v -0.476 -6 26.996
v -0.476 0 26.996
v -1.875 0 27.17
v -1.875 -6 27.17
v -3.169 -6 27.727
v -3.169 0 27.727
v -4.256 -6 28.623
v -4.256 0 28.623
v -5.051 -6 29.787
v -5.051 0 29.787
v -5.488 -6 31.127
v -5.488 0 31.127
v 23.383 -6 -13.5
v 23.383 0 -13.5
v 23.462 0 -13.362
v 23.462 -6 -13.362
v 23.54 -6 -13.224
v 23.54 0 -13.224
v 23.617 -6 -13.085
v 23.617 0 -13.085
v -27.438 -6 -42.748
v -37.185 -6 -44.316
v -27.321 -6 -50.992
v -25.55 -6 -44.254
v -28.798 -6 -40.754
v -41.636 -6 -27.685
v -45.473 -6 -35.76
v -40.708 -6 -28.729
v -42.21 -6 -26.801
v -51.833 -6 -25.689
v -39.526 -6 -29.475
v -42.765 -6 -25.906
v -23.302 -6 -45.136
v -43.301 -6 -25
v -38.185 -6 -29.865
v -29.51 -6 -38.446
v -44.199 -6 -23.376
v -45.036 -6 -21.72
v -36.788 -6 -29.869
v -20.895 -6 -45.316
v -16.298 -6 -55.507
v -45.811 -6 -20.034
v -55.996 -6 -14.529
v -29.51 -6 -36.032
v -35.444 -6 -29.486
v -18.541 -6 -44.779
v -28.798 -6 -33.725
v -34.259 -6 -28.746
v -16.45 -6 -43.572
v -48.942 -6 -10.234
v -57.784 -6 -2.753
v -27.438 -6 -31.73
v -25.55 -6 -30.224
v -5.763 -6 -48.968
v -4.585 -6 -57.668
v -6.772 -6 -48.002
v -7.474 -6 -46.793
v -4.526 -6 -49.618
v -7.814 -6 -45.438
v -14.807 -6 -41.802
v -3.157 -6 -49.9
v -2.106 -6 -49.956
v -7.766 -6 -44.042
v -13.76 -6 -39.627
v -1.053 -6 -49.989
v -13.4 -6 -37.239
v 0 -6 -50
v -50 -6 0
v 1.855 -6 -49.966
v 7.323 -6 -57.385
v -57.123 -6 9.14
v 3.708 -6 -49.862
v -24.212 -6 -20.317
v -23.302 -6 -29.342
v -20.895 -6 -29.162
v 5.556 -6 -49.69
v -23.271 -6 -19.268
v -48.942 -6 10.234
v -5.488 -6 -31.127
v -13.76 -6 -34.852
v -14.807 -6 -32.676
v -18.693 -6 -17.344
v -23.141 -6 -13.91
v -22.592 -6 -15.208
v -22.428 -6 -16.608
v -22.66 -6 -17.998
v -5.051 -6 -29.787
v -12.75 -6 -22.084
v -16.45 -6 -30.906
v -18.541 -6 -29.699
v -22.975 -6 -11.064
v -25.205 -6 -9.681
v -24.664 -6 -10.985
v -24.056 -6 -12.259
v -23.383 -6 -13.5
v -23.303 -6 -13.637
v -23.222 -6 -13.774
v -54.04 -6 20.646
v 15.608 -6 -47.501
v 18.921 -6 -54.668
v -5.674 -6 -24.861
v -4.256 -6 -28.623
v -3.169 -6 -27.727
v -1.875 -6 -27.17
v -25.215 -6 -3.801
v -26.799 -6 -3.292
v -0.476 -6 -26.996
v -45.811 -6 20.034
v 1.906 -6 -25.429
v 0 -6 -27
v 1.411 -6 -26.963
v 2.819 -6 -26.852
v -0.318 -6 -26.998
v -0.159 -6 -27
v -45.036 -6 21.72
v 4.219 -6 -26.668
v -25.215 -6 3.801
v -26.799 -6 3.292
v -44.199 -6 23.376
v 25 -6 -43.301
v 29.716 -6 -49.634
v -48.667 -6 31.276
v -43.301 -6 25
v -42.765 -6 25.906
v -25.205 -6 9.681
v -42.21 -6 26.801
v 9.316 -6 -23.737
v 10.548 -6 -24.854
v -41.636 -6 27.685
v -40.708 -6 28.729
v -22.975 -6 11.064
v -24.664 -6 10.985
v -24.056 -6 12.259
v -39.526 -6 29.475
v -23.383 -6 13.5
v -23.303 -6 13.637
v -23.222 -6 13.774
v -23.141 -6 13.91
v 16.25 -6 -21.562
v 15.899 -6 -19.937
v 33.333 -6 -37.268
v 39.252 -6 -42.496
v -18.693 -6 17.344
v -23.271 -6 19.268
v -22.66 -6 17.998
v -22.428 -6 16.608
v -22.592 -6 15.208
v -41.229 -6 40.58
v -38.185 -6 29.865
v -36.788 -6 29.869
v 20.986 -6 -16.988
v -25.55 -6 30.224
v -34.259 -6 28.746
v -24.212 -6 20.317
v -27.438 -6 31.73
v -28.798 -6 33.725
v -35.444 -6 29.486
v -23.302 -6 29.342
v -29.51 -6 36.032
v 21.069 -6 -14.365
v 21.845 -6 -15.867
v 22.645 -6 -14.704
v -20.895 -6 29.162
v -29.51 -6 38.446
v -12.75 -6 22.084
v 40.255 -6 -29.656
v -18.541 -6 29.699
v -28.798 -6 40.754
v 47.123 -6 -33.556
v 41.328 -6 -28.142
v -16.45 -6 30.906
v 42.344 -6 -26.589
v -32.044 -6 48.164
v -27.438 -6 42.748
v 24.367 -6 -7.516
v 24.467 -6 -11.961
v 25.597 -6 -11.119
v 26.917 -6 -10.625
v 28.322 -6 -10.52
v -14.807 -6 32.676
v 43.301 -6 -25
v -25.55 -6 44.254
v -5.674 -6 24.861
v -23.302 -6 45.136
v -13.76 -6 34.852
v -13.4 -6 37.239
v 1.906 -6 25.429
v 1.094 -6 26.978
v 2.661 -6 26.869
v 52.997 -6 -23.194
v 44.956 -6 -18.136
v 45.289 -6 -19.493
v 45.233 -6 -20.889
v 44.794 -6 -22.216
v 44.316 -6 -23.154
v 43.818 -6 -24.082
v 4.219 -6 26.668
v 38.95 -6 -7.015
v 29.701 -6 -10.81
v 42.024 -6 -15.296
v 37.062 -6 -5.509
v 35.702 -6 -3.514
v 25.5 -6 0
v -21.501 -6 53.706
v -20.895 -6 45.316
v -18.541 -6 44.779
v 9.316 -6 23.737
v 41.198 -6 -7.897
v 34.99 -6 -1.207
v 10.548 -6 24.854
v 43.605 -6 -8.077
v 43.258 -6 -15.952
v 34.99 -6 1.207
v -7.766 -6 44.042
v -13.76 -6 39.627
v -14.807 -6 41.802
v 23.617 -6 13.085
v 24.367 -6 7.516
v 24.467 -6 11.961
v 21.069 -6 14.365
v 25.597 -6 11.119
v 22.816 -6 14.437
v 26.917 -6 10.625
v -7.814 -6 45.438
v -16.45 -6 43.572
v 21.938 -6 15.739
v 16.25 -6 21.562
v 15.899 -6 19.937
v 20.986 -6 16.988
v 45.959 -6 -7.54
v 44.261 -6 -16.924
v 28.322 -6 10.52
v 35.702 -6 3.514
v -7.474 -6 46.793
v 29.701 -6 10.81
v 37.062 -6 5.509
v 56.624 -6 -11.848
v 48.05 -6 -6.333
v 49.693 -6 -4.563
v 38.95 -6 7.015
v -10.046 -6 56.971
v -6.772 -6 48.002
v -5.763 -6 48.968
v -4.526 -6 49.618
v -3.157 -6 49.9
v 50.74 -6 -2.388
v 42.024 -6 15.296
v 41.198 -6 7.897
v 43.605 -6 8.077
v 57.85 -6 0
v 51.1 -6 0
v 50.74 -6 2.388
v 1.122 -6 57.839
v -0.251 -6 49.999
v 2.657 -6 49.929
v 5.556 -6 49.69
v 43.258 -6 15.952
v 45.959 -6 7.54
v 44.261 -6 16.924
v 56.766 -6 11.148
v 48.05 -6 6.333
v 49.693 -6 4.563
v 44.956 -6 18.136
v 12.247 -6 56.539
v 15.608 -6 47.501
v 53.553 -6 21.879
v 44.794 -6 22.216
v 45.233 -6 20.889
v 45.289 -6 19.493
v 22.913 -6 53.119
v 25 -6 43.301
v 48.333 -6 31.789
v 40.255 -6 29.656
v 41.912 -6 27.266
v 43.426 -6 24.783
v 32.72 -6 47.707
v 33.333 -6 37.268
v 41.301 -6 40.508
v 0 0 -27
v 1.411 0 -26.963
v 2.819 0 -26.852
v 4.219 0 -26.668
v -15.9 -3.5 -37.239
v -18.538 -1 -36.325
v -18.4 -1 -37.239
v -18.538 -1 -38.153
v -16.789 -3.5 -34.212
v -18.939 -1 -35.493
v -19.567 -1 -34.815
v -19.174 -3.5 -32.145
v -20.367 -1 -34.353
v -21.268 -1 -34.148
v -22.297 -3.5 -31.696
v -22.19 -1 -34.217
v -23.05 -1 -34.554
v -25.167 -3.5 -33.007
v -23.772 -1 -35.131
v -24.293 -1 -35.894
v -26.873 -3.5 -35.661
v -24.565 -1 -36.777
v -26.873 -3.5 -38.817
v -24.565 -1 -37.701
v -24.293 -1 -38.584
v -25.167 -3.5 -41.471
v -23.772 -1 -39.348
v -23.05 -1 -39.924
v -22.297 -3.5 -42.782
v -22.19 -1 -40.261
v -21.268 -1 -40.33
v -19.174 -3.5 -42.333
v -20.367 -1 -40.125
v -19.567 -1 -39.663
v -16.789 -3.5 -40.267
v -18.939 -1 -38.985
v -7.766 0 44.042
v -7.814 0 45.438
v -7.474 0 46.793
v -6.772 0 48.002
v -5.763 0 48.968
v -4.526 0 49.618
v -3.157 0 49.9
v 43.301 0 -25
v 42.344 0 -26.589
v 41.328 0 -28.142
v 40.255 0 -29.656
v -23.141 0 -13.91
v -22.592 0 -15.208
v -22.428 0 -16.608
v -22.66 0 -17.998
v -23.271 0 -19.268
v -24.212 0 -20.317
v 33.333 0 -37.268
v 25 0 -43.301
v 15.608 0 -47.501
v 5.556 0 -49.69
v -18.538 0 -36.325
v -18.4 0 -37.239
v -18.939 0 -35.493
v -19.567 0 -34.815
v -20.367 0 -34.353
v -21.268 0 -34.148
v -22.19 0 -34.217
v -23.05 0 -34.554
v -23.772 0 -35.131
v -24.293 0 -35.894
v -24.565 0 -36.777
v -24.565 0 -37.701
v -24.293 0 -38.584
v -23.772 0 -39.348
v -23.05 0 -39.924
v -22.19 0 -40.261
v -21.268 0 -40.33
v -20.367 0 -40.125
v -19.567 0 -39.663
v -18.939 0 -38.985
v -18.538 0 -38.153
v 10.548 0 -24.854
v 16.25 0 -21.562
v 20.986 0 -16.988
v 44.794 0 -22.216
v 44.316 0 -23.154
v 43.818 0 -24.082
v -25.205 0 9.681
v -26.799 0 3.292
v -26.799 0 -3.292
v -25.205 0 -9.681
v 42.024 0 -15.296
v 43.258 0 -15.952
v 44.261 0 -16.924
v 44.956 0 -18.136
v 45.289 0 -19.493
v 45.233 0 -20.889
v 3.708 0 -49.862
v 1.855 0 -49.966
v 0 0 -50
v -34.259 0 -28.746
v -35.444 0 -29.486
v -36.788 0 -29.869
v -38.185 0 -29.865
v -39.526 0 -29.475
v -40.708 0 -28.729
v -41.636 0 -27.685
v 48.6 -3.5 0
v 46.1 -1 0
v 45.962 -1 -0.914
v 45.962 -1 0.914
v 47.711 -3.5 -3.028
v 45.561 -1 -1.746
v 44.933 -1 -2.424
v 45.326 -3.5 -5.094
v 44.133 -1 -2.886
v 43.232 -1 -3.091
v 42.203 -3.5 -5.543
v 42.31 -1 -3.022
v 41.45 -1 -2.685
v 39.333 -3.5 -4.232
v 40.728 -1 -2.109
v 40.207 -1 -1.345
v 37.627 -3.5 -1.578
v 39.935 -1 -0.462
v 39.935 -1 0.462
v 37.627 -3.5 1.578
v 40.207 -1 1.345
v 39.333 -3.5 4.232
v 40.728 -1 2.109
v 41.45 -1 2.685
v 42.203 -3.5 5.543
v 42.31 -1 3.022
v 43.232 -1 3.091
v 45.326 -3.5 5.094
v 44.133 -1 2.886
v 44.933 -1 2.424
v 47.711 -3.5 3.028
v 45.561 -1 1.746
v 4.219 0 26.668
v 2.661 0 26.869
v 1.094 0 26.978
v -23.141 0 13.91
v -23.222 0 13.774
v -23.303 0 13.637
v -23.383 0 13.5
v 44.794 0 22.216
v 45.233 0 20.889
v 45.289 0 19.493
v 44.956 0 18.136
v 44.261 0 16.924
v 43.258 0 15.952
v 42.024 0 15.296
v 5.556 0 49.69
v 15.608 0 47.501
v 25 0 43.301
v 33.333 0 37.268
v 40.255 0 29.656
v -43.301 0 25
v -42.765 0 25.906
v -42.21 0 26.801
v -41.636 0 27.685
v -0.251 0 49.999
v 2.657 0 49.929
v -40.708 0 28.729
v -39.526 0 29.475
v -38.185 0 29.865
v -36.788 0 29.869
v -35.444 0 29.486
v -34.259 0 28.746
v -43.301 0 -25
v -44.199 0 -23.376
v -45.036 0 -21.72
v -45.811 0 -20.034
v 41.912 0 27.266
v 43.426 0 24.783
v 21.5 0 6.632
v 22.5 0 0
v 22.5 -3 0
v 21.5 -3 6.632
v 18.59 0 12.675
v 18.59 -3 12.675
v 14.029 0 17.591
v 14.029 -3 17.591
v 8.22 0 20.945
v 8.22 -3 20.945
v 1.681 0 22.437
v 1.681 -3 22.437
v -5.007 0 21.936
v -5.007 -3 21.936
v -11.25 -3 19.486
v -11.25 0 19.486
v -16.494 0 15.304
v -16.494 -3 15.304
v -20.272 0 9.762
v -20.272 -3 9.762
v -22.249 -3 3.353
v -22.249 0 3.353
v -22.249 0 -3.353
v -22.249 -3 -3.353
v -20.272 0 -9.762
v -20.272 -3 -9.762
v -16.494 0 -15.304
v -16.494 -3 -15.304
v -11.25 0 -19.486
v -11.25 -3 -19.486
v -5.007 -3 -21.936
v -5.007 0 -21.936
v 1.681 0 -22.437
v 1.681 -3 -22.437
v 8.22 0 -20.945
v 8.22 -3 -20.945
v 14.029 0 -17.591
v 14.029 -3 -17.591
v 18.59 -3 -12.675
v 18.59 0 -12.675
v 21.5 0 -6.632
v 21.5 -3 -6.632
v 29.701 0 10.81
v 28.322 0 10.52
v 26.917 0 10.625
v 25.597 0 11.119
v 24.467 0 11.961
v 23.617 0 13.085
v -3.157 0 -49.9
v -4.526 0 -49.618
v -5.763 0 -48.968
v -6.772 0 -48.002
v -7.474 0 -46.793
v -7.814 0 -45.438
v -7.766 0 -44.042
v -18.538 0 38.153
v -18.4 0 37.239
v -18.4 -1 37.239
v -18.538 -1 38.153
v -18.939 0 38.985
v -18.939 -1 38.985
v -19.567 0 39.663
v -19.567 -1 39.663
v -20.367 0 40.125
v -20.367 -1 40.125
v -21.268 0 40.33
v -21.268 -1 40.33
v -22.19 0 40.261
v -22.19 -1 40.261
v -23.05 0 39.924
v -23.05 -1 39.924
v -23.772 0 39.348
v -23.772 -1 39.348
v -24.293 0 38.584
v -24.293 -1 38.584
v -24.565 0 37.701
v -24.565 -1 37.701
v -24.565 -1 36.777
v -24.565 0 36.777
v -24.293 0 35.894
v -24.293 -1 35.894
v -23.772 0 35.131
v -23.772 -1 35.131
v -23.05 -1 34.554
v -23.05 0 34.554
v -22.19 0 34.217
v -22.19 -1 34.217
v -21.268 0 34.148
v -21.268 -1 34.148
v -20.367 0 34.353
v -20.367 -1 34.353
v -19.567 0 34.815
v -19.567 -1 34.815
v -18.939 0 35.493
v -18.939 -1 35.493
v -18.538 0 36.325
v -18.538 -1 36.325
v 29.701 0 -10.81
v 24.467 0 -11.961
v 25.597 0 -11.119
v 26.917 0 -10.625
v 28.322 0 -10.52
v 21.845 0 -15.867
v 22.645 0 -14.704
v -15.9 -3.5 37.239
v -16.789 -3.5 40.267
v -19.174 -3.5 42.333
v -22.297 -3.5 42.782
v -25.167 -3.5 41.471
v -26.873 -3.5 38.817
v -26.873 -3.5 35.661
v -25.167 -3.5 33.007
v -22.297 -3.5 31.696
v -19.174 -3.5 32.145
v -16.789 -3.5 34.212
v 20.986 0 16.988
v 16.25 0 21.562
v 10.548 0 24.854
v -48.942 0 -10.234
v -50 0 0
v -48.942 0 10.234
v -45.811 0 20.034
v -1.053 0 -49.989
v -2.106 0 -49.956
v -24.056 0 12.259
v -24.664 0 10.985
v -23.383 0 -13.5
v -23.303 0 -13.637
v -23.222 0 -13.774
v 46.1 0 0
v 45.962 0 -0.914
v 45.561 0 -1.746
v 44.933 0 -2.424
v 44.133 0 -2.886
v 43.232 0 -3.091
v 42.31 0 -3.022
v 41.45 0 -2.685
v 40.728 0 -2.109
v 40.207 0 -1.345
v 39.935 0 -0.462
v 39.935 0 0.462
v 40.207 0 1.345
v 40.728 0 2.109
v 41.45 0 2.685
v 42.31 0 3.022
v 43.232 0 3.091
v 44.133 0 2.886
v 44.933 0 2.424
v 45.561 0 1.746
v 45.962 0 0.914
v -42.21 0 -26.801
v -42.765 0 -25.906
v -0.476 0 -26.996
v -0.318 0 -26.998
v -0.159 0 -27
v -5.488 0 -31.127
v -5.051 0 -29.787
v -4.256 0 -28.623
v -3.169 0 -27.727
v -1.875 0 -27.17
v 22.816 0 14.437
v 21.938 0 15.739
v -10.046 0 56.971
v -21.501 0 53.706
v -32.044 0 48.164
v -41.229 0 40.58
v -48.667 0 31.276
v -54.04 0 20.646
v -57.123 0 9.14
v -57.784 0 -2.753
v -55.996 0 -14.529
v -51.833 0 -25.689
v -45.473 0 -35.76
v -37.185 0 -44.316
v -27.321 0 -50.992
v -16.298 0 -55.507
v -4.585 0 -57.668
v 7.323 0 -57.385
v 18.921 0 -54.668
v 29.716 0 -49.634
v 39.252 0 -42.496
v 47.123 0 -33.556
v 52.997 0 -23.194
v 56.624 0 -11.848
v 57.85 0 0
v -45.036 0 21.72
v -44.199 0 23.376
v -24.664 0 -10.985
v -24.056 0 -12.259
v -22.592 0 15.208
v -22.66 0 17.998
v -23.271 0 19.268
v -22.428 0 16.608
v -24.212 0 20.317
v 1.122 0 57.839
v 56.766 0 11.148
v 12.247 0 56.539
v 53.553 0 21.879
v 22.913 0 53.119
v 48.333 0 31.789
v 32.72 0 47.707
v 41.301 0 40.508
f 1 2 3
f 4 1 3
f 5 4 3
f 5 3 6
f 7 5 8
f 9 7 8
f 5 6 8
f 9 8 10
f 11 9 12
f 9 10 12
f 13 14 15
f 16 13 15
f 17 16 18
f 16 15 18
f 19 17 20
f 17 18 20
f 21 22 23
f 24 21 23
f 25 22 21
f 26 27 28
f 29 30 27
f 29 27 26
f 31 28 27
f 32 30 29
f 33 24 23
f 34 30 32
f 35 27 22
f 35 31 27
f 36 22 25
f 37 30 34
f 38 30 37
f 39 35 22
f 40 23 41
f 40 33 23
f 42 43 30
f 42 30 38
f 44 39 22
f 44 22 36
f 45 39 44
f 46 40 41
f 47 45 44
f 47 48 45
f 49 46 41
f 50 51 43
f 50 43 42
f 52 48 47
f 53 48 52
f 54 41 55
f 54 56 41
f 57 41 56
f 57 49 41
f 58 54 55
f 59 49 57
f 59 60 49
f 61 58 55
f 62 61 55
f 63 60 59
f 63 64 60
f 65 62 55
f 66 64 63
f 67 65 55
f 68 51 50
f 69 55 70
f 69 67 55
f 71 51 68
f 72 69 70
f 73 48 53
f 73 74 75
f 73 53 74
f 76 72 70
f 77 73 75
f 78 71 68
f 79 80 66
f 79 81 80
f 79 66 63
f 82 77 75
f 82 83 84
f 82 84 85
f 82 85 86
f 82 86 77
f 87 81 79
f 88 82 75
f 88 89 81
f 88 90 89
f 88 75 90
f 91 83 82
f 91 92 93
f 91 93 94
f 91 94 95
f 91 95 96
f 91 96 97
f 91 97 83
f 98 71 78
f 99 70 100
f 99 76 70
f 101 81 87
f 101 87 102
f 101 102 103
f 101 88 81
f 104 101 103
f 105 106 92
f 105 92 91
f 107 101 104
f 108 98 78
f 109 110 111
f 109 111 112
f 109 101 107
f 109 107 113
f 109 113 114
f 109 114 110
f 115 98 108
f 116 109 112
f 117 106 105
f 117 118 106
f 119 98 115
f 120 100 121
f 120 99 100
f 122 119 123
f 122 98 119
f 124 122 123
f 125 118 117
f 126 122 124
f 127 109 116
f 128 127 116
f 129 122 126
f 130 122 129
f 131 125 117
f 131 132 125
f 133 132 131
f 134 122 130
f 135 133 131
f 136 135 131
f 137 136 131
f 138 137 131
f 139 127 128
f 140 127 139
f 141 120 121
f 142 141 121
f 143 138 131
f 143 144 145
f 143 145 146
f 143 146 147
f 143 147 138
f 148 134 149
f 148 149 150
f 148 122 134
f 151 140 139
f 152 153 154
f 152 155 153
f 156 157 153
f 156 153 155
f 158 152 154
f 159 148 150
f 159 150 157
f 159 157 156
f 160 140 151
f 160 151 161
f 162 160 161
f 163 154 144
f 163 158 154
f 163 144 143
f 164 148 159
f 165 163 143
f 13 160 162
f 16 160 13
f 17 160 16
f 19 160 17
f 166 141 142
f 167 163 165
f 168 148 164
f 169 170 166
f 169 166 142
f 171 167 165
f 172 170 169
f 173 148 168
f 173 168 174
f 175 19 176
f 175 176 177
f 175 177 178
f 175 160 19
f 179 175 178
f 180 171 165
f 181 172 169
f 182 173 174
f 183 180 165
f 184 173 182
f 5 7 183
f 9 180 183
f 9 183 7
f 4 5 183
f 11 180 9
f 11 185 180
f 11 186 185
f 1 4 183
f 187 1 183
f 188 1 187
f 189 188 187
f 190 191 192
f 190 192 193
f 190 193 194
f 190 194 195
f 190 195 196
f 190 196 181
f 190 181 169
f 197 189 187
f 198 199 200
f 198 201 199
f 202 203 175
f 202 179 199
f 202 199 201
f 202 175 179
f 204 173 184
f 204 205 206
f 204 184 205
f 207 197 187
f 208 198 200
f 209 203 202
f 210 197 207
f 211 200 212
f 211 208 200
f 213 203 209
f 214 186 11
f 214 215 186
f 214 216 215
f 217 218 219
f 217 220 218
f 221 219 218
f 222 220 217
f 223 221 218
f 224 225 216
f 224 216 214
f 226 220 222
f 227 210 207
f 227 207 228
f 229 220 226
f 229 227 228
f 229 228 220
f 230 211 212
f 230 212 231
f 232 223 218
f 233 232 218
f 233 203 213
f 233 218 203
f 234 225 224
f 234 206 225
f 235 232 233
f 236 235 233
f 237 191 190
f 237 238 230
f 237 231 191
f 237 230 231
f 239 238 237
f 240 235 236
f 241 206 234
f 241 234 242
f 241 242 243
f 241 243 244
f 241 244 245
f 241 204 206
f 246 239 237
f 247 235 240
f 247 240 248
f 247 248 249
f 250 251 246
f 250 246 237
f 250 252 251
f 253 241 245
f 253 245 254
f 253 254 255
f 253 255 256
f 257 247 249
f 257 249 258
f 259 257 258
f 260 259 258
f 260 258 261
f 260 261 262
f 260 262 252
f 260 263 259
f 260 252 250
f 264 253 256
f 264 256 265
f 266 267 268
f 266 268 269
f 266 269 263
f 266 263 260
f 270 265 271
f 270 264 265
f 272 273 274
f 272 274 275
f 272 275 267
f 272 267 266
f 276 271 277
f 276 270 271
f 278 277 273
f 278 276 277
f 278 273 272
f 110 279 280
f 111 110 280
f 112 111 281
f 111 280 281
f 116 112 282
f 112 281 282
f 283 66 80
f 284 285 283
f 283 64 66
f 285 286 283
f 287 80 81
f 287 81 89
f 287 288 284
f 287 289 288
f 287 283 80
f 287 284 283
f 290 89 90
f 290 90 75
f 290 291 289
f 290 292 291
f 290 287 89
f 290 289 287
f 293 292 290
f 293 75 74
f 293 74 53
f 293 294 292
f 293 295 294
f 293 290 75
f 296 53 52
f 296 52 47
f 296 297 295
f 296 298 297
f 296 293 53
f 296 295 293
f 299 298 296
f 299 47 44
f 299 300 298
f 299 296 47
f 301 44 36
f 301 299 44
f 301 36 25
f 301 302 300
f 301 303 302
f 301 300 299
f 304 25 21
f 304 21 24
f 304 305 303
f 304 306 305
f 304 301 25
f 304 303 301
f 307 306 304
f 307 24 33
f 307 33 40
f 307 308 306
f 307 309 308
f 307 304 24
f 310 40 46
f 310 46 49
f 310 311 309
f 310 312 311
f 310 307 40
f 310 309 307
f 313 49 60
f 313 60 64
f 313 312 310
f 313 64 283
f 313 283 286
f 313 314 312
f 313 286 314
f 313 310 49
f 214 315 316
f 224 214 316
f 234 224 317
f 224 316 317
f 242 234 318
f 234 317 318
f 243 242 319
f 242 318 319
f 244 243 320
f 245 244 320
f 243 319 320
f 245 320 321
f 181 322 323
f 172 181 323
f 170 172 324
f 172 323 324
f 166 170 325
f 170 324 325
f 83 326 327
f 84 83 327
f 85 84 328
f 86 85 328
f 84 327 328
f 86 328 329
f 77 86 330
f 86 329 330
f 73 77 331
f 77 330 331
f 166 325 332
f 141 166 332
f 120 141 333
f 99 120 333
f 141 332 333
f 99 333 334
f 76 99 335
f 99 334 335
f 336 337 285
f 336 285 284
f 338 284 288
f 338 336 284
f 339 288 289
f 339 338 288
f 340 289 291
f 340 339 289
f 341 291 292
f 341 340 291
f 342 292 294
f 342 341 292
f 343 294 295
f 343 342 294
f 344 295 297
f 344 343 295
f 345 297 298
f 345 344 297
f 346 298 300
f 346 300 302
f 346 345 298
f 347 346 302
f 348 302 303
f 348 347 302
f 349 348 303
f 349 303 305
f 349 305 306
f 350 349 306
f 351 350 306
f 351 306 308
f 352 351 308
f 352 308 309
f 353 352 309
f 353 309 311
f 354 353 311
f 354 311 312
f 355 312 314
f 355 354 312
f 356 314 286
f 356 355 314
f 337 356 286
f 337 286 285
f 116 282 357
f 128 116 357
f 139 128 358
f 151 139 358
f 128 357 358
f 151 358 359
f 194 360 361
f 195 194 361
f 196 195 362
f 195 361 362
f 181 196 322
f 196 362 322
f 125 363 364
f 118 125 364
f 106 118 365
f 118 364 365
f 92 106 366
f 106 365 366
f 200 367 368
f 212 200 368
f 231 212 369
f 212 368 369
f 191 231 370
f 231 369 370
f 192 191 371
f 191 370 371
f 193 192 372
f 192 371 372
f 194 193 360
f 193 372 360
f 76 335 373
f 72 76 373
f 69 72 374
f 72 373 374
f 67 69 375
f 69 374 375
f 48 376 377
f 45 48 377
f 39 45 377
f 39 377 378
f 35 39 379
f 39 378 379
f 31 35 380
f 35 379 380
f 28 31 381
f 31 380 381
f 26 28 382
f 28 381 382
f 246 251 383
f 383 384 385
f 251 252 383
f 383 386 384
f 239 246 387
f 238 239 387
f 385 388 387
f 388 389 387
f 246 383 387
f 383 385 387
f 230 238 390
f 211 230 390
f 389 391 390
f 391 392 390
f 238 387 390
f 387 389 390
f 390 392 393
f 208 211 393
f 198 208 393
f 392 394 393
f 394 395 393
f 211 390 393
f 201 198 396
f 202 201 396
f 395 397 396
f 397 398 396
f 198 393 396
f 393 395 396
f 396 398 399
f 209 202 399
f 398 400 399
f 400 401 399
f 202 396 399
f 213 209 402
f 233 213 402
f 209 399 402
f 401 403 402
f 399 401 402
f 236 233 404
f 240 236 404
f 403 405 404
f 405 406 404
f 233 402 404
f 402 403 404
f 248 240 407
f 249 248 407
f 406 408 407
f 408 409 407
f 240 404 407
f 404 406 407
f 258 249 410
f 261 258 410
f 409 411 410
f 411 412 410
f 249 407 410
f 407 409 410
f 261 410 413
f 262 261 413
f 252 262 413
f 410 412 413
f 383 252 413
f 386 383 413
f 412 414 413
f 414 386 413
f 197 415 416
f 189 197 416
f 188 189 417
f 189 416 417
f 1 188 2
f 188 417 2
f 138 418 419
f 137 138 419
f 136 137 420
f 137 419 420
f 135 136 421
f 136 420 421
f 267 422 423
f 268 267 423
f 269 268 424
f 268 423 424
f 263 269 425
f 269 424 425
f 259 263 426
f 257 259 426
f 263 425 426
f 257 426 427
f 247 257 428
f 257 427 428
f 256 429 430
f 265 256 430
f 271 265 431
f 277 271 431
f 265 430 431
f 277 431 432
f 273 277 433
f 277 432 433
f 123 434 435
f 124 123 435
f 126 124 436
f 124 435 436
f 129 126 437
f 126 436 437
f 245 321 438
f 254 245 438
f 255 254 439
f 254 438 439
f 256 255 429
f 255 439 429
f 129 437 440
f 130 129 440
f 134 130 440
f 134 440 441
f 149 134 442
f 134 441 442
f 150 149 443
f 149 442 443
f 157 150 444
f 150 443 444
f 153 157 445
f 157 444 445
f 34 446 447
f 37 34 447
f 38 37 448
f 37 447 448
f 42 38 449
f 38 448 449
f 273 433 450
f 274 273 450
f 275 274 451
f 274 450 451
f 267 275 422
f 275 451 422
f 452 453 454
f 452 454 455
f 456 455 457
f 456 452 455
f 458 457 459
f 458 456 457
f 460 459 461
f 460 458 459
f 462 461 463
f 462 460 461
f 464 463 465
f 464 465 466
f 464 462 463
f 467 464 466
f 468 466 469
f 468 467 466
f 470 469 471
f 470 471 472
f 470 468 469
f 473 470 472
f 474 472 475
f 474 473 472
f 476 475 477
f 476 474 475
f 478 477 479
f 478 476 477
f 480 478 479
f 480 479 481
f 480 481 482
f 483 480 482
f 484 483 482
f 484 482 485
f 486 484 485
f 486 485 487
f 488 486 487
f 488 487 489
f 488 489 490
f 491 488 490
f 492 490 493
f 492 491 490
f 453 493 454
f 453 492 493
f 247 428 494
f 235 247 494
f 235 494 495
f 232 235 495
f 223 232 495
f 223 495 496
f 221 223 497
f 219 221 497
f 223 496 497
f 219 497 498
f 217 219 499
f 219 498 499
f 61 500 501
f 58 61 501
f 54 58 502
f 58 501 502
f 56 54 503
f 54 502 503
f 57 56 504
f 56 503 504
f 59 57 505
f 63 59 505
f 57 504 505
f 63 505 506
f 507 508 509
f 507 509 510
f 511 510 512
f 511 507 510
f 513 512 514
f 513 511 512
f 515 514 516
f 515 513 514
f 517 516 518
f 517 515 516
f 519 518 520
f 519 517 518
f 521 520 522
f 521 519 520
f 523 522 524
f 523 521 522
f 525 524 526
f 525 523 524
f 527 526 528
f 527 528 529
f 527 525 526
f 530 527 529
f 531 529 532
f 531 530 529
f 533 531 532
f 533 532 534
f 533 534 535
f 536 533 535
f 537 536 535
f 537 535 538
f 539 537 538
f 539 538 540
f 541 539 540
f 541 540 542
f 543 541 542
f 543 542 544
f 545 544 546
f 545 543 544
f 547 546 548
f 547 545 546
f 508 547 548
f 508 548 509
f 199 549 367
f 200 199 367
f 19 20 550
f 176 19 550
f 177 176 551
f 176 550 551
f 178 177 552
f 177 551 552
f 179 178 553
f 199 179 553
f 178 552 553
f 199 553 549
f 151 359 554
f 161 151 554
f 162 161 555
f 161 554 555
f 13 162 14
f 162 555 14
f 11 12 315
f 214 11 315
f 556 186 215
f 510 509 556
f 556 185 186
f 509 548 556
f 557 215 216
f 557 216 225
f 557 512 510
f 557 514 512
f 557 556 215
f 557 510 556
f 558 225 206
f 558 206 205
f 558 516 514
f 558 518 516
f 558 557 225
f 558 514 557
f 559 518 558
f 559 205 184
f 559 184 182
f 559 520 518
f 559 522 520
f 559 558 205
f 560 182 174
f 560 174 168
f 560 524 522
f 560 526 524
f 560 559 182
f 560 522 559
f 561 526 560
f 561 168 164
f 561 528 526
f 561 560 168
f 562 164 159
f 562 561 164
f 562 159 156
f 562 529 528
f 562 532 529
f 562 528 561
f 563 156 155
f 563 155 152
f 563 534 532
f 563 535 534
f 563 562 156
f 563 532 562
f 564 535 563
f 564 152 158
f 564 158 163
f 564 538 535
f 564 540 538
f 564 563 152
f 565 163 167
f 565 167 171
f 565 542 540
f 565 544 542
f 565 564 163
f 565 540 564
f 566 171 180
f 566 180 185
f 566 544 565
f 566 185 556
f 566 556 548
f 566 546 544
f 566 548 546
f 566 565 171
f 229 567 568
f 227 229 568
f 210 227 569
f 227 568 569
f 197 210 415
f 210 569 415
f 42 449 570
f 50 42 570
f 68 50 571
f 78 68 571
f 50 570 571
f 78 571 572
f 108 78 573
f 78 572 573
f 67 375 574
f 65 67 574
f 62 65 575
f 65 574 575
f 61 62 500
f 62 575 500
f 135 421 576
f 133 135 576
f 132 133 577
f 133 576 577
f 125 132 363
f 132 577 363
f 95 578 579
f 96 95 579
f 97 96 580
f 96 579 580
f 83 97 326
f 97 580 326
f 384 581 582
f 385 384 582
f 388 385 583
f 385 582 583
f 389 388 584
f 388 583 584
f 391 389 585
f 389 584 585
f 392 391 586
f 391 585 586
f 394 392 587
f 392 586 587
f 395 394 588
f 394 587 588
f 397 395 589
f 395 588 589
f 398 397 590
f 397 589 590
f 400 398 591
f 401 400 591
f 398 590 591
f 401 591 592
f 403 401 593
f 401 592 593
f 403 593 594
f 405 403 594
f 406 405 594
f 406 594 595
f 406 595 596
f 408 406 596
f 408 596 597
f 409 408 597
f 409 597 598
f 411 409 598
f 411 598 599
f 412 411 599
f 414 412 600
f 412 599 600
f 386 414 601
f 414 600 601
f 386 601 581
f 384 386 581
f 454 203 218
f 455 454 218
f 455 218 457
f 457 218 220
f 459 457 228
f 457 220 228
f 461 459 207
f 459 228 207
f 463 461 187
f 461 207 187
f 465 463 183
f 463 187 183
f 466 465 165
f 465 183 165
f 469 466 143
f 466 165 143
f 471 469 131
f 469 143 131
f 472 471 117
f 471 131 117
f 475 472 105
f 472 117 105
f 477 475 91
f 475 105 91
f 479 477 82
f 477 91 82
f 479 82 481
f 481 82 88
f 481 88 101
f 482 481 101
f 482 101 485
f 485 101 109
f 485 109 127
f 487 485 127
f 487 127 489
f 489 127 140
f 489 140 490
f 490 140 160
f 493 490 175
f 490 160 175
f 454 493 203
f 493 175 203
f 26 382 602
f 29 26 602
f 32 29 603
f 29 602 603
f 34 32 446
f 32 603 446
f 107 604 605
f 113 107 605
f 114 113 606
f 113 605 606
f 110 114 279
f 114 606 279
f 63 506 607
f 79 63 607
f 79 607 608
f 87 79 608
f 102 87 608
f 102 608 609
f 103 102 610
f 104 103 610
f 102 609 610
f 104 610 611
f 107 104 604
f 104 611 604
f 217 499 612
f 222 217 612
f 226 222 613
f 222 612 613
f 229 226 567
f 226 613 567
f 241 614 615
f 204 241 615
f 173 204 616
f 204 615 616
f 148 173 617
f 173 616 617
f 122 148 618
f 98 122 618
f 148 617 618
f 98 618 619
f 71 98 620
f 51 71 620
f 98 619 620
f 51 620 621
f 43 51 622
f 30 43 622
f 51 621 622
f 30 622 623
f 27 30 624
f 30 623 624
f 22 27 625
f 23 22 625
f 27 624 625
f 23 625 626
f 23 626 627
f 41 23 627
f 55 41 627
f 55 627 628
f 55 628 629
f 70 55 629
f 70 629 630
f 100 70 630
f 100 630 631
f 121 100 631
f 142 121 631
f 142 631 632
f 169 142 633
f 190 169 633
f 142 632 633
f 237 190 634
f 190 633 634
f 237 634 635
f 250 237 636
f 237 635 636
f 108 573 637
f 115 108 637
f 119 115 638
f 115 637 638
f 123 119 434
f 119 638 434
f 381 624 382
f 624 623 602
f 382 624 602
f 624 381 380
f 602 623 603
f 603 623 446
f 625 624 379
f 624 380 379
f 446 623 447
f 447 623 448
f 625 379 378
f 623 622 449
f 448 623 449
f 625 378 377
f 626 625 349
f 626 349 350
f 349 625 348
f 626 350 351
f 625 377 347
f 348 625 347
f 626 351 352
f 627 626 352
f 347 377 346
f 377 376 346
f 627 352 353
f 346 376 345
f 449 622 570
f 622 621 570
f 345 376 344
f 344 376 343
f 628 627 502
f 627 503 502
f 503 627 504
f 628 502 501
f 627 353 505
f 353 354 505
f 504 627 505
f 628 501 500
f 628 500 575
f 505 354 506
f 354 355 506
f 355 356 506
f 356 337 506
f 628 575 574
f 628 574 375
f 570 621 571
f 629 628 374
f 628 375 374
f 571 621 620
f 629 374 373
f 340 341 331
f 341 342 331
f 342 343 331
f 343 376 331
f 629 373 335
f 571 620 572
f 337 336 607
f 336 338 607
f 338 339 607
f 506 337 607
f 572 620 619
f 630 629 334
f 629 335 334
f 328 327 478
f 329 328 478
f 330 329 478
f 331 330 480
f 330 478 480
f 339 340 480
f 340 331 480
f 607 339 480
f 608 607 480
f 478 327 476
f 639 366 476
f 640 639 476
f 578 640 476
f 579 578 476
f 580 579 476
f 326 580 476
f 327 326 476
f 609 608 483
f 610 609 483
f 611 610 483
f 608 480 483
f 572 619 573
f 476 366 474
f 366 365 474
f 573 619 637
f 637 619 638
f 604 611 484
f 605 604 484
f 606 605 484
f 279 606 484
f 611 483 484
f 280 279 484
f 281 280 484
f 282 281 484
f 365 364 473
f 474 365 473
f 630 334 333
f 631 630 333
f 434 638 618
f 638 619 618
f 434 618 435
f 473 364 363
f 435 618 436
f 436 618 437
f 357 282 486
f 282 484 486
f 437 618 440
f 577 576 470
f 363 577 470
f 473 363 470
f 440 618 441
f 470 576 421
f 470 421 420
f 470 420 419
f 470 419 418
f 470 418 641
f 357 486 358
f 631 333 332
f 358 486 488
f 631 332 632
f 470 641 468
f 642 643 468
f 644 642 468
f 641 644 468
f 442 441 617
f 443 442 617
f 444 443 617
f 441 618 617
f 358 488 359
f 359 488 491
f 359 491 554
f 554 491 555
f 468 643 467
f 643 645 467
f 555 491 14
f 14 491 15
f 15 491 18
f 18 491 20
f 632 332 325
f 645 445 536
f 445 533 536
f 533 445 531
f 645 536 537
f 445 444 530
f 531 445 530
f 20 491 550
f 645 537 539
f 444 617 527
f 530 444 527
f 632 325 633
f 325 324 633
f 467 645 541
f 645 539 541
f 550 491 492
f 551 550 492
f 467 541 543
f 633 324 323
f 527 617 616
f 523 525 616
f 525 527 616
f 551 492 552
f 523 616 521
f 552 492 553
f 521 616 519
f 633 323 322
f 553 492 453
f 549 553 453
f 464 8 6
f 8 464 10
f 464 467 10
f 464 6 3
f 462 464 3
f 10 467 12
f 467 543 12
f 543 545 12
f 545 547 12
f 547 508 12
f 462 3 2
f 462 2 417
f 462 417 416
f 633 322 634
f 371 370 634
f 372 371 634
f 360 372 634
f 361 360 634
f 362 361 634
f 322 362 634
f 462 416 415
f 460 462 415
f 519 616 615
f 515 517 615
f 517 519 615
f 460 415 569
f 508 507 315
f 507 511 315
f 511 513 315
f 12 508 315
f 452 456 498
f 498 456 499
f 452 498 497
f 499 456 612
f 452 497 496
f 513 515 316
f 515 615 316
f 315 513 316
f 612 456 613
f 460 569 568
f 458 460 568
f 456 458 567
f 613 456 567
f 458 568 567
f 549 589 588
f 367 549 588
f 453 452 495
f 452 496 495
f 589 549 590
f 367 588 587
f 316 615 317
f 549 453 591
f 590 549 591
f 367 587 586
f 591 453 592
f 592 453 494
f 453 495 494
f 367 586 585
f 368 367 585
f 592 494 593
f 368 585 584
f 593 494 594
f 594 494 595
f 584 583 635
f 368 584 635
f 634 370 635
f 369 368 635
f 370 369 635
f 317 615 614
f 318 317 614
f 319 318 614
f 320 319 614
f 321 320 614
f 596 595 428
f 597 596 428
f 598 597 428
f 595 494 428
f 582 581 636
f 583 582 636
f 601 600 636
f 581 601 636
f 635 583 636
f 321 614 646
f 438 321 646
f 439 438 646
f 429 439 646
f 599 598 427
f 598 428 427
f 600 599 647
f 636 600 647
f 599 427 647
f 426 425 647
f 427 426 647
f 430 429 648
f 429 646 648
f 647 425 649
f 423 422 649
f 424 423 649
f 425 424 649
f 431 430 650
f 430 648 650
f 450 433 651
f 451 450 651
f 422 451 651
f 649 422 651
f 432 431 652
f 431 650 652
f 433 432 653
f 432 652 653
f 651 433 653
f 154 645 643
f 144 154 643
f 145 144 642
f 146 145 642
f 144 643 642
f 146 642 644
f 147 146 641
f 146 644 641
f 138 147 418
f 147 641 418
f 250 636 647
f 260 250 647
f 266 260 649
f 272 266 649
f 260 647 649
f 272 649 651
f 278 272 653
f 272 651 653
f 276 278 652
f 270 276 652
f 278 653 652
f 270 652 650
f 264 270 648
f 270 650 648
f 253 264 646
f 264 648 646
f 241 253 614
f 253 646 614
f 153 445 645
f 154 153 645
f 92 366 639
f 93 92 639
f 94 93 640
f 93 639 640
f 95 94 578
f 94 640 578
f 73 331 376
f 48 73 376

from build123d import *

# Parameters (mm, degrees)
F0_R     = 3.1
F0_R_2   = 22.5
F1_DEPTH = 6
F2_SIZE2 = 3
F2_SIZE  = 3
F3_SIZE2 = 5
F3_SIZE  = 5
F4_SIZE  = 5
F5_SIZE2 = 5
F5_SIZE  = 5


with BuildPart() as f1:
    # F0 (on Front) → F1 (new body)
    with BuildSketch(Plane.XZ):
        with BuildLine():
            ThreePointArc((-10.045547, 56.971129), (-37.185263, -44.315671), (57.85, 0))
            ThreePointArc((57.85, 0), (37.185263, 44.315671), (-10.045547, 56.971129))
        make_face()
        with Locations((-21.5, -37.239092)):
            Circle(F0_R, mode=Mode.SUBTRACT)
        with BuildLine():
            ThreePointArc((-23.382686, 13.5), (-24.368717, 11.626075), (-25.204864, 9.680642))
            ThreePointArc((-25.204864, 9.680642), (-27, 0), (-25.204864, -9.680642))
            ThreePointArc((-25.204864, -9.680642), (-24.368717, -11.626075), (-23.382686, -13.5))
            ThreePointArc((-23.382686, -13.5), (-23.262708, -13.705708), (-23.14092, -13.91035))
            ThreePointArc((-23.14092, -13.91035), (-22.49477, -17.311118), (-24.212337, -20.316563))
            Line((-24.212337, -20.316563), (-34.258549, -28.746336))
            ThreePointArc((-34.258549, -28.746336), (-38.184741, -29.865123), (-41.636097, -27.684571))
            ThreePointArc((-41.636097, -27.684571), (-42.489891, -26.35544), (-43.30127, -25))
            ThreePointArc((-43.30127, -25), (-44.625232, -22.551911), (-45.810926, -20.033948))
            ThreePointArc((-45.810926, -20.033948), (-50, 0), (-45.810926, 20.033948))
            ThreePointArc((-45.810926, 20.033948), (-44.625232, 22.551911), (-43.30127, 25))
            ThreePointArc((-43.30127, 25), (-42.489891, 26.35544), (-41.636097, 27.684571))
            ThreePointArc((-41.636097, 27.684571), (-38.184741, 29.865123), (-34.258549, 28.746336))
            Line((-34.258549, 28.746336), (-24.212337, 20.316563))
            ThreePointArc((-24.212337, 20.316563), (-22.49477, 17.311118), (-23.14092, 13.91035))
            ThreePointArc((-23.14092, 13.91035), (-23.262708, 13.705708), (-23.382686, 13.5))
        make_face(mode=Mode.SUBTRACT)
        Circle(F0_R_2, mode=Mode.SUBTRACT)
        with BuildLine():
            ThreePointArc((4.21875, -26.668374), (13.5, -23.382686), (20.986114, -16.987731))
            ThreePointArc((20.986114, -16.987731), (22.252835, -15.29089), (23.382686, -13.5))
            ThreePointArc((23.382686, -13.5), (23.500845, -13.293242), (23.617176, -13.085449))
            ThreePointArc((23.617176, -13.085449), (26.239253, -10.825483), (29.700828, -10.810217))
            Line((29.700828, -10.810217), (42.024332, -15.295606))
            ThreePointArc((42.024332, -15.295606), (44.956326, -18.136394), (44.79359, -22.215632))
            ThreePointArc((44.79359, -22.215632), (44.069426, -23.619605), (43.30127, -25))
            ThreePointArc((43.30127, -25), (41.843144, -27.370629), (40.255371, -29.656452))
            ThreePointArc((40.255371, -29.656452), (25, -43.30127), (5.555556, -49.690399))
            ThreePointArc((5.555556, -49.690399), (2.782088, -49.92254), (0, -50))
            ThreePointArc((0, -50), (-1.579535, -49.975044), (-3.157493, -49.900203))
            ThreePointArc((-3.157493, -49.900203), (-6.771585, -48.001517), (-7.765783, -44.041942))
            Line((-7.765783, -44.041942), (-5.488491, -31.12678))
            ThreePointArc((-5.488491, -31.12678), (-3.744483, -28.136601), (-0.476257, -26.995799))
            ThreePointArc((-0.476257, -26.995799), (-0.238138, -26.99895), (0, -27))
            ThreePointArc((0, -27), (2.115882, -26.916966), (4.21875, -26.668374))
        make_face(mode=Mode.SUBTRACT)
        with BuildLine():
            ThreePointArc((39.9, 0), (43, 3.1), (46.1, 0))
            ThreePointArc((46.1, 0), (43, -3.1), (39.9, 0))
        make_face(mode=Mode.SUBTRACT)
        with Locations((-21.5, 37.239092)):
            Circle(F0_R, mode=Mode.SUBTRACT)
        with BuildLine():
            ThreePointArc((20.986114, 16.987731), (13.5, 23.382686), (4.21875, 26.668374))
            ThreePointArc((4.21875, 26.668374), (1.878394, 26.934581), (-0.476257, 26.995799))
            ThreePointArc((-0.476257, 26.995799), (-3.744483, 28.136601), (-5.488491, 31.12678))
            Line((-5.488491, 31.12678), (-7.765783, 44.041942))
            ThreePointArc((-7.765783, 44.041942), (-6.771585, 48.001517), (-3.157493, 49.900203))
            ThreePointArc((-3.157493, 49.900203), (1.203611, 49.985511), (5.555556, 49.690399))
            ThreePointArc((5.555556, 49.690399), (25, 43.30127), (40.255371, 29.656452))
            ThreePointArc((40.255371, 29.656452), (42.686917, 26.035114), (44.79359, 22.215632))
            ThreePointArc((44.79359, 22.215632), (44.956326, 18.136394), (42.024332, 15.295606))
            Line((42.024332, 15.295606), (29.700828, 10.810217))
            ThreePointArc((29.700828, 10.810217), (26.239253, 10.825483), (23.617176, 13.085449))
            ThreePointArc((23.617176, 13.085449), (22.386834, 15.094028), (20.986114, 16.987731))
        make_face(mode=Mode.SUBTRACT)
    extrude(amount=F1_DEPTH)

    # F2
    f2_edges = [f1.edges().sort_by_distance(p)[0] for p in [
        (-22.5, -6, 0),
    ]]
    chamfer(f2_edges, length=F2_SIZE, length2=F2_SIZE2)

    # F3
    f3_edges = [f1.edges().sort_by_distance(p)[0] for p in [
        (-24.6, -6, 37.239092),
    ]]
    chamfer(f3_edges, length=F3_SIZE, length2=F3_SIZE2)

    # F4
    f4_edges = [f1.edges().sort_by_distance(p)[0] for p in [
        (-24.6, -6, -37.239092),
    ]]
    chamfer(f4_edges, length=F4_SIZE)

    # F5
    f5_edges = [f1.edges().sort_by_distance(p)[0] for p in [
        (39.9, -6, 0),
    ]]
    chamfer(f5_edges, length=F5_SIZE, length2=F5_SIZE2)


solid = f1.part
